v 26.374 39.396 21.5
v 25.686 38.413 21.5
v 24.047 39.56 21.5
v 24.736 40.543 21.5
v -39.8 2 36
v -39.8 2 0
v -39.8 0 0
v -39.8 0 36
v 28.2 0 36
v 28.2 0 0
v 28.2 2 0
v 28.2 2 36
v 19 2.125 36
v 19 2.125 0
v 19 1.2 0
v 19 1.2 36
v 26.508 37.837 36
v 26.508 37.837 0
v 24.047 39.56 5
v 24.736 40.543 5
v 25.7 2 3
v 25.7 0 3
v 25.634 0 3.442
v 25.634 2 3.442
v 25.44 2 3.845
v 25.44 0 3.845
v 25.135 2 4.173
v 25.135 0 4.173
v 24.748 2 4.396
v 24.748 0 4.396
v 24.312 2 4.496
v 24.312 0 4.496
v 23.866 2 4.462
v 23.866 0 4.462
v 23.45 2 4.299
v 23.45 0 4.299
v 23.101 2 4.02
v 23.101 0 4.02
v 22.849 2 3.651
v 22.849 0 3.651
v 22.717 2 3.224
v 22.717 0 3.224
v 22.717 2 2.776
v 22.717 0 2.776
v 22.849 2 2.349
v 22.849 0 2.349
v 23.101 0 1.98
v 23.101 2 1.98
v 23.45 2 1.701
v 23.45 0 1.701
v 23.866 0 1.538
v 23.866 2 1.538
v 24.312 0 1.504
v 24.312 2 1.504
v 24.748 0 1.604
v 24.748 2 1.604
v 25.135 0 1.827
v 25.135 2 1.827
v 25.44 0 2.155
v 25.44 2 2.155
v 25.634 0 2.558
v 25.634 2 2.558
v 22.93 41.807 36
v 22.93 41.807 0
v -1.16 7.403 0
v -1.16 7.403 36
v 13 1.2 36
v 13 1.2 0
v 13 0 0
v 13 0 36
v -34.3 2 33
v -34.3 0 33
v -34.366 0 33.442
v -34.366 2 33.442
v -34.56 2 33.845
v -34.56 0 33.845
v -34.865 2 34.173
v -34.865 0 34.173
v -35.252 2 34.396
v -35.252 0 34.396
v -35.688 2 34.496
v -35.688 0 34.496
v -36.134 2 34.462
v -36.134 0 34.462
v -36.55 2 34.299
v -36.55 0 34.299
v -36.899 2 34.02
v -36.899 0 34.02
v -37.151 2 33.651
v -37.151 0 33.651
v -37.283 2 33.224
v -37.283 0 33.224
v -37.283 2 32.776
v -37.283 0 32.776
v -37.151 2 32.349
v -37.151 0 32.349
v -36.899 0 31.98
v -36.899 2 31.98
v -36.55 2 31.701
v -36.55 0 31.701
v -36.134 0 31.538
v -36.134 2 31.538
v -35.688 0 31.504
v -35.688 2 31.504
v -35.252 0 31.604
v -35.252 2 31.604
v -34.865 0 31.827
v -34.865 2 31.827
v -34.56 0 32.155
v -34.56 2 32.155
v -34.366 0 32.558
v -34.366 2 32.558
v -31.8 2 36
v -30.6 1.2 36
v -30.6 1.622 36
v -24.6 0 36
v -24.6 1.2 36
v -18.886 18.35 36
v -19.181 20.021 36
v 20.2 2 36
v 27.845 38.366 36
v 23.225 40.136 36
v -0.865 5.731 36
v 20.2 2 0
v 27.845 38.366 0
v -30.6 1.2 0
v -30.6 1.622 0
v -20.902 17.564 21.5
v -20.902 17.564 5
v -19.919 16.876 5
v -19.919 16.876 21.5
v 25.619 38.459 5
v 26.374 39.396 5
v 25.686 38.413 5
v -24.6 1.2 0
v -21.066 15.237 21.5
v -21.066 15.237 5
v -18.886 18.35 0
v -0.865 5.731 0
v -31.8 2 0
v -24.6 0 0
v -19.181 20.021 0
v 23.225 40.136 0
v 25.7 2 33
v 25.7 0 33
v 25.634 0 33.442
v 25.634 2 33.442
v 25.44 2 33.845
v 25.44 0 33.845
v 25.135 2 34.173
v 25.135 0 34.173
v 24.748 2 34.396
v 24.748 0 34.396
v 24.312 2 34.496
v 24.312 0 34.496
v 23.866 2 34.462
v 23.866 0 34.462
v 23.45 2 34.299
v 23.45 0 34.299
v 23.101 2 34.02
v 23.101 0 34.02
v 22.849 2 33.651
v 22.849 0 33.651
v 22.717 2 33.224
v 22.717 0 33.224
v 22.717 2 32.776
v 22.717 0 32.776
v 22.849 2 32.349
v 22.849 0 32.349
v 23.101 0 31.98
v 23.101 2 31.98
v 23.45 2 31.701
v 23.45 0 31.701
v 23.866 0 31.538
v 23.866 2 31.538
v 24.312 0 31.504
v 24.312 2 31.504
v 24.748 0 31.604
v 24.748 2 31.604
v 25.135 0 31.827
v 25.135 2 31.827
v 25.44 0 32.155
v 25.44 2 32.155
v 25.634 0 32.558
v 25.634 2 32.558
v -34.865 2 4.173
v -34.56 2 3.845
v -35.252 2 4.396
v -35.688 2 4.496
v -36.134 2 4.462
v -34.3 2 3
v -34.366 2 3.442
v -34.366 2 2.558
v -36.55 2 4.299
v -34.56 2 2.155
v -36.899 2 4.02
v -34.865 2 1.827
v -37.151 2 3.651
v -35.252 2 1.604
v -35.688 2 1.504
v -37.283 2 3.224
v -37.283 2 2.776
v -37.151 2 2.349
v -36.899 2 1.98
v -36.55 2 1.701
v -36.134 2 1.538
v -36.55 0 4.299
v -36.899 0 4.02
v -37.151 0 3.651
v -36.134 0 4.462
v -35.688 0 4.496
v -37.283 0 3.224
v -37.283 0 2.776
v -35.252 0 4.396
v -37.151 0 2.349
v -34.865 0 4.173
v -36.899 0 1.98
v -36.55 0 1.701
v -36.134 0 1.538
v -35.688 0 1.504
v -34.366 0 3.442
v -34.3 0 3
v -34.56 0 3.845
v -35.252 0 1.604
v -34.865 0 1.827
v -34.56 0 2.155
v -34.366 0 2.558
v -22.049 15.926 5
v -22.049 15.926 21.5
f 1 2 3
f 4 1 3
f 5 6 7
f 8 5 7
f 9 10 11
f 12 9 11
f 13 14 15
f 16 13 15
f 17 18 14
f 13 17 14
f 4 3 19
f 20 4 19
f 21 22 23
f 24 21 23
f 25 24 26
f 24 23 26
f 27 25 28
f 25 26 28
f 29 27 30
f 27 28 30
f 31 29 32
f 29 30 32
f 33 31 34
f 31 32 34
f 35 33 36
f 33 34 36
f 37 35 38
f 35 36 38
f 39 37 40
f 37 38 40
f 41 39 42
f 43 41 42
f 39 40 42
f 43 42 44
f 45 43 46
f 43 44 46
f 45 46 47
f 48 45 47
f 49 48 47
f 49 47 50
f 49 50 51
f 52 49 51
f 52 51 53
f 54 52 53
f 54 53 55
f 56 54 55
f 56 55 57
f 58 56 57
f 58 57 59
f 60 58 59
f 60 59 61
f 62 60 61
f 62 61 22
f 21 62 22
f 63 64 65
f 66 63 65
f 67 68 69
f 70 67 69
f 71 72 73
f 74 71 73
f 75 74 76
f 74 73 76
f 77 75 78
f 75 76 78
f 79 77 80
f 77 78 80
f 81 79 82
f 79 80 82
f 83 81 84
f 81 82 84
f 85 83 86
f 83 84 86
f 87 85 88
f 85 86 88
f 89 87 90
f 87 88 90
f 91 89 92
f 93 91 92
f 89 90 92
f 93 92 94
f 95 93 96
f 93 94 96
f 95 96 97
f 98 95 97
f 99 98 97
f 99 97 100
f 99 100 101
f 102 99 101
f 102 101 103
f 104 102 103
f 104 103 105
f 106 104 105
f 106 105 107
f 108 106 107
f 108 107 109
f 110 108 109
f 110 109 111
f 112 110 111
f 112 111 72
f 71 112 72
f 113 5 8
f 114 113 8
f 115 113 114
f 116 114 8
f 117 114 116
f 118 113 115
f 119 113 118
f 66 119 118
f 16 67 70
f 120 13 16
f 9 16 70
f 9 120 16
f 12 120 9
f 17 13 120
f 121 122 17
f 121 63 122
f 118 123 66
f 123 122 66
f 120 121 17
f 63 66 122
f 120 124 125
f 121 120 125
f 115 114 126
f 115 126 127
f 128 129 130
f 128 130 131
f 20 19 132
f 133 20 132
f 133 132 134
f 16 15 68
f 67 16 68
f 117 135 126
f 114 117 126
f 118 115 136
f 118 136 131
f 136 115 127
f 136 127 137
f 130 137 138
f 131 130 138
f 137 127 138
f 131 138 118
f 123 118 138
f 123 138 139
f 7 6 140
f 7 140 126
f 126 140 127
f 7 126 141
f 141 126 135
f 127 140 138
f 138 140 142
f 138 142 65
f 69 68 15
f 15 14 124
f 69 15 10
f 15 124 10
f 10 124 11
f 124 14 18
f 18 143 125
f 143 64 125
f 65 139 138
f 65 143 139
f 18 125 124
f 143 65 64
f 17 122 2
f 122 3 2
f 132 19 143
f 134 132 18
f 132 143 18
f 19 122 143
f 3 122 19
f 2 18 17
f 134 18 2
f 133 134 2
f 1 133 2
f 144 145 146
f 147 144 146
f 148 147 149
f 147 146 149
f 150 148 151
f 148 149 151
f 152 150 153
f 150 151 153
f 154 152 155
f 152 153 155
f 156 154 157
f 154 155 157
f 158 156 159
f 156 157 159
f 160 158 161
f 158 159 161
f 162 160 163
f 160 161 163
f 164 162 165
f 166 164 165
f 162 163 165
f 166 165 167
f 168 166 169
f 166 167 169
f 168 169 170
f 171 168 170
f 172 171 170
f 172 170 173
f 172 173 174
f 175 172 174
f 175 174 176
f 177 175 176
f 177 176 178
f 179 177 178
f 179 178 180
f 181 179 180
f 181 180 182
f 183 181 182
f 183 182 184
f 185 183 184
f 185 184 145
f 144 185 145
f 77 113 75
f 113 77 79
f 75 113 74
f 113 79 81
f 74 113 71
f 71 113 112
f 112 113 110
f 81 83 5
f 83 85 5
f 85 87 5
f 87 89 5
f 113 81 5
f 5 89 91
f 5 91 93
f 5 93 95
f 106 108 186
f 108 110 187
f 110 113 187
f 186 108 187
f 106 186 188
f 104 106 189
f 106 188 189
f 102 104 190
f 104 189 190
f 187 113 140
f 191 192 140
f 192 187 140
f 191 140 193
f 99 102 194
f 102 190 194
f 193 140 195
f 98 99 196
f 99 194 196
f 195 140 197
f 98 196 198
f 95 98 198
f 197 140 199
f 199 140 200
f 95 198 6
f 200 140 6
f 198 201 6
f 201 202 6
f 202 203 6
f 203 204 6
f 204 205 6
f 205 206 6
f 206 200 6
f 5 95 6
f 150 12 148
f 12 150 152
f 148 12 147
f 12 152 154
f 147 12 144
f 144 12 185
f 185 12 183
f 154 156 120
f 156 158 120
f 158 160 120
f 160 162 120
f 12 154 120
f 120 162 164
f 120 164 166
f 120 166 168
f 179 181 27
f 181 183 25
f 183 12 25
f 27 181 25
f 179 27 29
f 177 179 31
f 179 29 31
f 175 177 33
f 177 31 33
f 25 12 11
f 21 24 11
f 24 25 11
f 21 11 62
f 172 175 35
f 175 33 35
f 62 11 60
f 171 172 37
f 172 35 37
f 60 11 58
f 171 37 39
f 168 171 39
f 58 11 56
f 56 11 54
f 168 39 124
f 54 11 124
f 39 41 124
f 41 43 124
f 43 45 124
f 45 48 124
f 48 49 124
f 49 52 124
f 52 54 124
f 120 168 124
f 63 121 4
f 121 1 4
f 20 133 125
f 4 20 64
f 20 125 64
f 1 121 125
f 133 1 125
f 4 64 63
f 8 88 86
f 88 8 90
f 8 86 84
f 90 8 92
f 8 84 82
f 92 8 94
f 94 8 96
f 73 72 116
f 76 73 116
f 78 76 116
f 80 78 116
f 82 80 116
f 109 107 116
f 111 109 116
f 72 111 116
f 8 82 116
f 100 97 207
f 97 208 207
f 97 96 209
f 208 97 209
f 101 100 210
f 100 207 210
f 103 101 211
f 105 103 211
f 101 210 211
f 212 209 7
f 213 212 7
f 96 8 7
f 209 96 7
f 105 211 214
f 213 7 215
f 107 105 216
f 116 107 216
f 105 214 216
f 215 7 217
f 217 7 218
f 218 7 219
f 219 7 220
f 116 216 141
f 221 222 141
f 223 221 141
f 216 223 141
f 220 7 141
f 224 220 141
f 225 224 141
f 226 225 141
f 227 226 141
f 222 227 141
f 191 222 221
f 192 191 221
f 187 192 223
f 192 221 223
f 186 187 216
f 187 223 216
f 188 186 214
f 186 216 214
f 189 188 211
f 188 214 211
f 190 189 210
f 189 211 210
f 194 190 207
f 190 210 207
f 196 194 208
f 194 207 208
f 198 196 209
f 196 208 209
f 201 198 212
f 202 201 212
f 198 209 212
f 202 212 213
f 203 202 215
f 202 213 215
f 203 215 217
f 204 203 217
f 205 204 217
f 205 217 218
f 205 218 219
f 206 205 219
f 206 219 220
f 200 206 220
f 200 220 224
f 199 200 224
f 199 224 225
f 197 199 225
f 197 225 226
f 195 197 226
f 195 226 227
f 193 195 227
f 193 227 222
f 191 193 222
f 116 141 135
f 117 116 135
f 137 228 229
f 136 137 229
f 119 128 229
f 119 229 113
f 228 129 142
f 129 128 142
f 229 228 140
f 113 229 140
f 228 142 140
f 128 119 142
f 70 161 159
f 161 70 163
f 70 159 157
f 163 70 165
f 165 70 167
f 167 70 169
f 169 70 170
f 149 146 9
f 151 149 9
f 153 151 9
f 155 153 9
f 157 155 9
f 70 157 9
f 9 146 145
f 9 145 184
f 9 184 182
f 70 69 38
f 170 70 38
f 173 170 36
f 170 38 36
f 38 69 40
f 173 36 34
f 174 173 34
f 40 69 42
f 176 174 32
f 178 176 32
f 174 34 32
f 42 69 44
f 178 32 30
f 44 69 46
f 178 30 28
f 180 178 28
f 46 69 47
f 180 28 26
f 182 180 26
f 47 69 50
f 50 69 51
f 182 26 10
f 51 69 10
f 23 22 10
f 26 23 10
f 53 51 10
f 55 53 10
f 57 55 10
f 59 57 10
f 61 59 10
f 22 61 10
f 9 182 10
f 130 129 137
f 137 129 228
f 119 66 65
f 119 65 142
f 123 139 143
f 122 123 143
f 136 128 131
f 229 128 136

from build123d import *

# Parameters (mm, degrees)
F0_W     = 4
F0_H     = 2
F1_DEPTH = 36
F0_W_2   = 37.6
F0_H_2   = 1.2
F2_DEPTH = 36
F3_R     = 1.5
F4_DEPTH = 3
F5_W     = 2
F5_H     = 16.5
F6_DEPTH = 2
F8_DEPTH = 25


with BuildPart() as f1:
    # F0 (on Top) → F1 (new body)
    with BuildSketch(Plane.XY):
        Polygon((-39.799847, 0), (-35.799847, 0), (-31.799847, 0), (-31.799847, 2), (-39.799847, 2), align=None)
        with Locations((22.200153, 1)):
            Rectangle(F0_W, F0_H)
        with Locations((26.200153, 1)):
            Rectangle(F0_W, F0_H)
        Polygon((-31.799847, 2), (-31.799847, 0), (-24.599847, 0), (-24.599847, 1.2), (-30.599847, 1.2), (-30.599847, 1.621641), (-18.886474, 18.350071), (-0.865129, 5.731389), (23.225081, 40.135775), (26.507962, 37.837077), (19.000153, 2.124774), (19.000153, 1.2), (13.000153, 1.2), (13.000153, 0), (20.200153, 0), (20.200153, 2), (27.845302, 38.365591), (22.93039, 41.807049), (-1.15982, 7.402663), (-19.181165, 20.021345), align=None)
    extrude(amount=F1_DEPTH)

    # F0 (on Top) → F2 (cut)
    with BuildSketch(Plane.XY):
        with Locations((-5.799847, 0.6)):
            Rectangle(F0_W_2, F0_H_2)
    extrude(amount=-F2_DEPTH, mode=Mode.SUBTRACT)

    # F3 (on face) → F4 (cut)
    with BuildSketch(Plane.XZ):
        with Locations((-35.799847, 33)):
            Circle(F3_R)
        with Locations((24.200153, 33)):
            Circle(F3_R)
        with Locations((24.200153, 3)):
            Circle(F3_R)
        with Locations((-35.799847, 3)):
            Circle(F3_R)
    extrude(amount=-F4_DEPTH, mode=Mode.SUBTRACT)

    # F5 (on face) → F6 (cut)
    with BuildSketch(Plane(origin=(-22.27771, 15.599021, 0), x_dir=(-0.573576, -0.819152, 0), z_dir=(-0.819152, 0.573576, 0))):
        with Locations((-1.398661, 13.25)):
            Rectangle(F5_W, F5_H)
    extrude(amount=-F6_DEPTH, mode=Mode.SUBTRACT)

    # F7 (on face) → F8 (cut)
    with BuildSketch(Plane(origin=(26.498464, 37.843728, 0), x_dir=(0.819152, -0.573576, 0), z_dir=(-0.573576, -0.819152, 0))):
        Polygon((-2.992234, 5), (-1.992234, 5), (-0.992234, 5), (-0.992234, 21.5), (-2.992234, 21.5), align=None)
    extrude(amount=-F8_DEPTH, mode=Mode.SUBTRACT)


solid = f1.part
